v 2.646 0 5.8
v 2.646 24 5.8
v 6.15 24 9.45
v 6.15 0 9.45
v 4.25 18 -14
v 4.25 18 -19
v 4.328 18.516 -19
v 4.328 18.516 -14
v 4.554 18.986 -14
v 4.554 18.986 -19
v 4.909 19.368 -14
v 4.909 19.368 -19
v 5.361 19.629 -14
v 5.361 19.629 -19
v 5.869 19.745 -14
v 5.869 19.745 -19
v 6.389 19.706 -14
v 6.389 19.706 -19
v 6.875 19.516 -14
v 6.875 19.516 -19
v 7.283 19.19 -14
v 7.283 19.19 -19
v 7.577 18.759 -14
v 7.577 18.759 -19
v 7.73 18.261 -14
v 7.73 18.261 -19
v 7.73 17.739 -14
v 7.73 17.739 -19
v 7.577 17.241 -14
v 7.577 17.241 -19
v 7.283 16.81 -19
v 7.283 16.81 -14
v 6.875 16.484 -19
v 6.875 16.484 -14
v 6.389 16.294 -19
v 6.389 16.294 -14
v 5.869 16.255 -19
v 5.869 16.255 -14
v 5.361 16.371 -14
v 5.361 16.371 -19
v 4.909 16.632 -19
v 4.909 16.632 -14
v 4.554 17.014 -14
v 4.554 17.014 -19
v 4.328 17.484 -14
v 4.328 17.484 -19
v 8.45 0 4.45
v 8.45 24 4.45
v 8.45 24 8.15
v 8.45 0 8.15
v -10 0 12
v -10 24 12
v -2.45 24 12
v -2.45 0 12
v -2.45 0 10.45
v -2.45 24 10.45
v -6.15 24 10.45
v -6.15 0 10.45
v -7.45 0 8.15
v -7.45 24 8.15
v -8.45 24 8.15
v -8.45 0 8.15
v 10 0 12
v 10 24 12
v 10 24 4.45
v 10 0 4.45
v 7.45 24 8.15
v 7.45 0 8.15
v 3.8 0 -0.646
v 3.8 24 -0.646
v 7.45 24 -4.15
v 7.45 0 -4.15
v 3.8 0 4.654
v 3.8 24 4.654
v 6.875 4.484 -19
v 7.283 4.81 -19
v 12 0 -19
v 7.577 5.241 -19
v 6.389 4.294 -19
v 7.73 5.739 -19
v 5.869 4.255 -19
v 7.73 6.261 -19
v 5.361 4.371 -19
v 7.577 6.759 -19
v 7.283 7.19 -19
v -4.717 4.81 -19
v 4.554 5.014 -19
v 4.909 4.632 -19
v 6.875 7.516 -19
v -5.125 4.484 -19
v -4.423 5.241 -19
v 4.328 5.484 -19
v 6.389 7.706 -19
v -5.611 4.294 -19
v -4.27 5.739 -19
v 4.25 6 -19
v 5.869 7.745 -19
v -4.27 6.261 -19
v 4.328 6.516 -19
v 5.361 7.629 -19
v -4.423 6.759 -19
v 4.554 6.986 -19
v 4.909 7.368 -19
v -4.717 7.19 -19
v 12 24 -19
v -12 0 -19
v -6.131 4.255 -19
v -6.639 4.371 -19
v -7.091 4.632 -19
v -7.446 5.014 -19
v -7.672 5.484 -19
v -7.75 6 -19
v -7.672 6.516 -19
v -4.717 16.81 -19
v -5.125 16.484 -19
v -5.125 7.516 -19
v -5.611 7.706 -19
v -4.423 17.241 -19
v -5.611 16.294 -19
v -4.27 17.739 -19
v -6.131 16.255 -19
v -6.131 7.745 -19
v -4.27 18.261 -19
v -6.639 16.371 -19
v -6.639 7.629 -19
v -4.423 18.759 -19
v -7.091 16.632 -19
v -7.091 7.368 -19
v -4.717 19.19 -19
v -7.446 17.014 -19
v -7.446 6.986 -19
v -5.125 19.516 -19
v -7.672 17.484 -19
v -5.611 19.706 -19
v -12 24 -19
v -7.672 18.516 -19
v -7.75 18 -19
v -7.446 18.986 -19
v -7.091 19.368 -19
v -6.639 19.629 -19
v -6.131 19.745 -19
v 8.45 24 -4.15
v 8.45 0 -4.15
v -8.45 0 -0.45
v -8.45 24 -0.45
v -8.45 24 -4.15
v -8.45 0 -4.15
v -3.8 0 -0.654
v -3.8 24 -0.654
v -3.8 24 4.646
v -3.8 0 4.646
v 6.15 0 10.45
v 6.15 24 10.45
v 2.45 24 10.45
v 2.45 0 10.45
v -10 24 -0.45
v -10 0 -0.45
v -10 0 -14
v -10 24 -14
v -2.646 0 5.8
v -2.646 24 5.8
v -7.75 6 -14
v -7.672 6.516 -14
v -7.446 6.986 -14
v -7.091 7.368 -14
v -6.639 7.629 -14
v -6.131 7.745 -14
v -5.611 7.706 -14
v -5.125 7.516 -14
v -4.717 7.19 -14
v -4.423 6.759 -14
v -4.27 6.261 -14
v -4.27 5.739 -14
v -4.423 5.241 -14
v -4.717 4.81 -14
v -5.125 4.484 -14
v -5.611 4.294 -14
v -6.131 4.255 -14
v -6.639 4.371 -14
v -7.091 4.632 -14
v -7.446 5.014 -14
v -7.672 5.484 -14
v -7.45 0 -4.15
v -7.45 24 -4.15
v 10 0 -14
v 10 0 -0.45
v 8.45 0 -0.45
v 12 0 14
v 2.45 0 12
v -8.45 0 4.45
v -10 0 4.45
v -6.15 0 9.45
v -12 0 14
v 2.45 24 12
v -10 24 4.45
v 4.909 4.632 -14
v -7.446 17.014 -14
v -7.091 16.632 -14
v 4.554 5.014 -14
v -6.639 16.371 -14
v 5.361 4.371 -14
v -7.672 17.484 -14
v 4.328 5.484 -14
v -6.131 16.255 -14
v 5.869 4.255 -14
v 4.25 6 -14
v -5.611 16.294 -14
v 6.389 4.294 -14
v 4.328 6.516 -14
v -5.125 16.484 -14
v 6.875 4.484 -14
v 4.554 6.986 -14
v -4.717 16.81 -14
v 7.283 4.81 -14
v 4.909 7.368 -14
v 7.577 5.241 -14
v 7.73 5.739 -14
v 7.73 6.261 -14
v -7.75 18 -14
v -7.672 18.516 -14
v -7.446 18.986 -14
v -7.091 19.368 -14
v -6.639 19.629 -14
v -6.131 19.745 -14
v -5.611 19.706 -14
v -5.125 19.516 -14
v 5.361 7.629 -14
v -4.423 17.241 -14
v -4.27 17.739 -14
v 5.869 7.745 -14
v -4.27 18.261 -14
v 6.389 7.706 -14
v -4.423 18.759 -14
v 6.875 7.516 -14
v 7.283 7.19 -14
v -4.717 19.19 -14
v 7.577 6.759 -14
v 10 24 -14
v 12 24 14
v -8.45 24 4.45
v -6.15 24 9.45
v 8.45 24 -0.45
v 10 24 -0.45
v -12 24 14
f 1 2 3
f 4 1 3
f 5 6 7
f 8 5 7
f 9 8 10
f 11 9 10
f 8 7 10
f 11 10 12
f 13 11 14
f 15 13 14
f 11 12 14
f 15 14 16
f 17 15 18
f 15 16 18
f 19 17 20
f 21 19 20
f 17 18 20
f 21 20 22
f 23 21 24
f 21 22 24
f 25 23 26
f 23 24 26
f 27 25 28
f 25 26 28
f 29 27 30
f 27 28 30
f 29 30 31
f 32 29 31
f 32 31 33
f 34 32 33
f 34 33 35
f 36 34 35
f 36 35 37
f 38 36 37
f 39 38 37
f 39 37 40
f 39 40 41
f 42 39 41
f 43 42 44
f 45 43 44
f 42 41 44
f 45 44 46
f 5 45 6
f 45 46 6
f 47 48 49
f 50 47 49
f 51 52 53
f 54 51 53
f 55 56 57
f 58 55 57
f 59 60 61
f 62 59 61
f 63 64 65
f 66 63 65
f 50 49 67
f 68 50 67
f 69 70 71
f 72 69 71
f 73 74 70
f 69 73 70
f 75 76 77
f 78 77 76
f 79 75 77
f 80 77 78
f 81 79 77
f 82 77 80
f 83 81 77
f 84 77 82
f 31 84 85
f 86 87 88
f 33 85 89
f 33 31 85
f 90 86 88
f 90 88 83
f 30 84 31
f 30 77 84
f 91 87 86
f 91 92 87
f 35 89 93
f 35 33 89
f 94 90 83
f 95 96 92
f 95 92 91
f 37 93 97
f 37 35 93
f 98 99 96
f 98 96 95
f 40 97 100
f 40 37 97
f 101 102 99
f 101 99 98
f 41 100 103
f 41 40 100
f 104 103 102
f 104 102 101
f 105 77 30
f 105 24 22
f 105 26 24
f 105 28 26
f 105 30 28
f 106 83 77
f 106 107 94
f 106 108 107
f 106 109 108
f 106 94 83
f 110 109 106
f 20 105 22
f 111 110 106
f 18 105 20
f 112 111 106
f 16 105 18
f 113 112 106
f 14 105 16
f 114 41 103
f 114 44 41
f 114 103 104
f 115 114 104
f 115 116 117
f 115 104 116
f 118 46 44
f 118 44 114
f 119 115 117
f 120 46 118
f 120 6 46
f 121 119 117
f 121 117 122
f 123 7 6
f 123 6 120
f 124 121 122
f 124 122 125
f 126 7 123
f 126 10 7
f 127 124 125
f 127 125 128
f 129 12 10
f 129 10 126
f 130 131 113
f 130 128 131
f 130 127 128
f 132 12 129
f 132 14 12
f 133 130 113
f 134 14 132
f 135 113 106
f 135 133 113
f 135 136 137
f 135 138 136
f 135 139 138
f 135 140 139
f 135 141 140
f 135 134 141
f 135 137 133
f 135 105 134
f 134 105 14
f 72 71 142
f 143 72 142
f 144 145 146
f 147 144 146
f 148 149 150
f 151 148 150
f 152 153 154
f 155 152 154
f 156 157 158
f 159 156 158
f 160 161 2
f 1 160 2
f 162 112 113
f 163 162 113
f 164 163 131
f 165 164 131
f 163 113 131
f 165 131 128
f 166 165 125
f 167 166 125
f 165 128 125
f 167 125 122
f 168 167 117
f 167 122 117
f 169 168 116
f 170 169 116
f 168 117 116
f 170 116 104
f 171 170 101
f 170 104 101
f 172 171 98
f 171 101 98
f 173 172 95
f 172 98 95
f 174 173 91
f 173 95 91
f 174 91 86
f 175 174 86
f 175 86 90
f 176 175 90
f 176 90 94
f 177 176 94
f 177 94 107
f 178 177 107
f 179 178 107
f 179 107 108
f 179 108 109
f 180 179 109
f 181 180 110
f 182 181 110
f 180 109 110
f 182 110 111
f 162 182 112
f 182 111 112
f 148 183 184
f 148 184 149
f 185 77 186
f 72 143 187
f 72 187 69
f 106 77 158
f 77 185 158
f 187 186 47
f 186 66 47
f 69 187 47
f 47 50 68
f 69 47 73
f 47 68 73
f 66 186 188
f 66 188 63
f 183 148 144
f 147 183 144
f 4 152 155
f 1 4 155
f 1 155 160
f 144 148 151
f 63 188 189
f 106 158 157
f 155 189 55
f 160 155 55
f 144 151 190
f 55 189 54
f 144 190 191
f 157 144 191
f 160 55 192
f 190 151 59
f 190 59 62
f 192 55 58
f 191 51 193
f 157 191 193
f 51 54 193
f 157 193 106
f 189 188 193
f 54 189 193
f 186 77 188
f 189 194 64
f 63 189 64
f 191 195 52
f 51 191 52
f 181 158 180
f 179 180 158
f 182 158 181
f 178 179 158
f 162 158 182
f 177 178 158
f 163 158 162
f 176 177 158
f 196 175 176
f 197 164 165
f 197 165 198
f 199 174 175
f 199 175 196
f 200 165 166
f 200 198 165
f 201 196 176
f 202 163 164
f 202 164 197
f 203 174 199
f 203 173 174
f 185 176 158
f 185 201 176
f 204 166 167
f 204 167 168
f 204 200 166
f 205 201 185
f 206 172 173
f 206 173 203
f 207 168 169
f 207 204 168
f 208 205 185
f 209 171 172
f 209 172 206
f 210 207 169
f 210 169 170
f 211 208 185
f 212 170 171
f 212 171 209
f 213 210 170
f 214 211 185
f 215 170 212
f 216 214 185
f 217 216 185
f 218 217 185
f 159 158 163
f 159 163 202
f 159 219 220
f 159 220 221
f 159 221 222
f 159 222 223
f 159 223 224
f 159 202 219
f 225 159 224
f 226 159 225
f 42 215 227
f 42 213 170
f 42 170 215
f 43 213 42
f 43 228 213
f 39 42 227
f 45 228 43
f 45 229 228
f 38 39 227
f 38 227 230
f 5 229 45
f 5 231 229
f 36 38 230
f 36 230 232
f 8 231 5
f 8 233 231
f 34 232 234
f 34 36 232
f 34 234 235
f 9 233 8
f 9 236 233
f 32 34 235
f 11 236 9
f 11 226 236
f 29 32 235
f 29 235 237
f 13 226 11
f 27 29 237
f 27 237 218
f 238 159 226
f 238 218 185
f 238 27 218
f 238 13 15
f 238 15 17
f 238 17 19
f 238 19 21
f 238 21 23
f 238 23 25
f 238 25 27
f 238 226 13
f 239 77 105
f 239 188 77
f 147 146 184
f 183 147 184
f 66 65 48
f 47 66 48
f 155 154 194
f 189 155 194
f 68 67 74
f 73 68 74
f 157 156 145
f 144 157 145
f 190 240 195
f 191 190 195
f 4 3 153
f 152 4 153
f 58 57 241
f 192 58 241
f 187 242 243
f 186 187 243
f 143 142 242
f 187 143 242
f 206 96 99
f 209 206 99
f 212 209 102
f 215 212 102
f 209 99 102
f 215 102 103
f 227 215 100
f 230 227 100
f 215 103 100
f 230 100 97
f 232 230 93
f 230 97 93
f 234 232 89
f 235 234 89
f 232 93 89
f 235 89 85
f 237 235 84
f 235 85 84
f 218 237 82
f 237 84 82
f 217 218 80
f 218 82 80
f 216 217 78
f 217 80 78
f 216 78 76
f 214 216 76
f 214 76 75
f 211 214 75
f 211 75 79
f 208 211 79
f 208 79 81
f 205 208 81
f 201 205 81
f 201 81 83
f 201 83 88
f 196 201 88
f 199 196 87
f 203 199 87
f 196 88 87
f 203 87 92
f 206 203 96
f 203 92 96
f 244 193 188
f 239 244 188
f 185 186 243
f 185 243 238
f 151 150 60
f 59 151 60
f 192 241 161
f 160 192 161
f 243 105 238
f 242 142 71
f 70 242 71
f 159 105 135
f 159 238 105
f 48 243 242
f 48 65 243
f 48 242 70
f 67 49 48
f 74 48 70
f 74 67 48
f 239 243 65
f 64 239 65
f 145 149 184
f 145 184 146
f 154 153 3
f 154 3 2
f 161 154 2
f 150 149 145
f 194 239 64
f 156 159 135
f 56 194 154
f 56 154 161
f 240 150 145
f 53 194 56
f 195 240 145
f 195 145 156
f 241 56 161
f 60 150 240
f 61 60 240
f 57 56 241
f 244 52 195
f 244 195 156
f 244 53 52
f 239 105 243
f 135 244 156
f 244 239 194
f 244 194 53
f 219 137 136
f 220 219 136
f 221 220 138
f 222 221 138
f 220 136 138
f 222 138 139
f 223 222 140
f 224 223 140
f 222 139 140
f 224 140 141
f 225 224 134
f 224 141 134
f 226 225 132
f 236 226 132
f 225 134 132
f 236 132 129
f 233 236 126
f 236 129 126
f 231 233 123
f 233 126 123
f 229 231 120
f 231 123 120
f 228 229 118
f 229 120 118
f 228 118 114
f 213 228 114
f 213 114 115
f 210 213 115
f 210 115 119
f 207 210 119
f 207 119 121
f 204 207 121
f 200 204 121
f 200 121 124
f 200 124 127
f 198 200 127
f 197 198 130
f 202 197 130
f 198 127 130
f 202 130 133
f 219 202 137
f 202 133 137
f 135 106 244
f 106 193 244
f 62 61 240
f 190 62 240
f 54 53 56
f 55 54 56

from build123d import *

# Parameters (mm, degrees)
ESQUISSE1_W             = 24
ESQUISSE1_H             = 28
BOSS_EXTRU_1_DEPTH      = 24
ENL_V_MAT_EXTRU_1_DEPTH = 24
ESQUISSE5_W             = 24
ESQUISSE5_H             = 24
BOSS_EXTRU_2_DEPTH      = 5
ENL_V_MAT_EXTRU_6_DEPTH = 24
ESQUISSE7_R             = 1.75
ENL_V_MAT_EXTRU_8_DEPTH = 5


with BuildPart() as part:
    # Esquisse1 → Boss.-Extru.1 (new body)
    with BuildSketch(Plane(origin=(0, 0, 0), x_dir=(1, 0, 0), z_dir=(0, 1, 0))):
        Rectangle(ESQUISSE1_W, ESQUISSE1_H)
    extrude(amount=BOSS_EXTRU_1_DEPTH)

    # Esquisse3 → Enlèv. mat.-Extru.1 (cut)
    with BuildSketch(Plane(origin=(0, 24, 0), x_dir=(1, 0, 0), z_dir=(0, 1, 0))):
        Polygon((-10, -12), (-2.45, -12), (-2.45, -10.45), (-6.15, -10.45), (-6.15, -9.45), (-2.645559959, -5.8), (2.645559959, -5.8), (6.15, -9.45), (6.15, -10.45), (2.45, -10.45), (2.45, -12), (10, -12), (10, -4.45), (8.45, -4.45), (8.45, -8.15), (7.45, -8.15), (3.8, -4.654440041), (3.8, 0.645559959), (7.45, 4.15), (8.45, 4.15), (8.45, 0.45), (10, 0.45), (10, 8), (2.45, 8), (2.45, 6.45), (6.15, 6.45), (6.15, 5.45), (2.645559959, 1.8), (-2.645559959, 1.8), (-6.15, 5.45), (-6.15, 6.45), (-2.45, 6.45), (-2.45, 8), (-10, 8), (-10, 0.45), (-8.45, 0.45), (-8.45, 4.15), (-7.45, 4.15), (-3.8, 0.654440041), (-3.8, -4.645559959), (-7.45, -8.15), (-8.45, -8.15), (-8.45, -4.45), (-10, -4.45), align=None)
    extrude(amount=-ENL_V_MAT_EXTRU_1_DEPTH, mode=Mode.SUBTRACT)

    # Esquisse5 → Boss.-Extru.2 (add)
    with BuildSketch(Plane(origin=(0, 0, -14), x_dir=(-1, 0, 0), z_dir=(0, 0, -1))):
        with Locations((0, 12)):
            Rectangle(ESQUISSE5_W, ESQUISSE5_H)
    extrude(amount=BOSS_EXTRU_2_DEPTH)

    # Esquisse6 → Enlèv. mat.-Extru.6 (cut)
    with BuildSketch(Plane(origin=(0, 24, 0), x_dir=(1, 0, 0), z_dir=(0, 1, 0))):
        Polygon((-10, 8), (-10, 14), (10, 14), (10, 8), (2.45, 8), (2.45, 6.45), (6.15, 6.45), (6.15, 5.45), (2.645559959, 1.8), (-2.645559959, 1.8), (-6.15, 5.45), (-6.15, 6.45), (-2.45, 6.45), (-2.45, 8), align=None)
    extrude(amount=-ENL_V_MAT_EXTRU_6_DEPTH, mode=Mode.SUBTRACT)

    # Esquisse7 → Enlèv. mat.-Extru.8 (cut)
    with BuildSketch(Plane(origin=(0, 0, -19), x_dir=(-1, 0, 0), z_dir=(0, 0, -1))):
        with Locations((-6, 18)):
            Circle(ESQUISSE7_R)
        with Locations((-6, 6)):
            Circle(ESQUISSE7_R)
        with Locations((6, 6)):
            Circle(ESQUISSE7_R)
        with Locations((6, 18)):
            Circle(ESQUISSE7_R)
    extrude(amount=-ENL_V_MAT_EXTRU_8_DEPTH, mode=Mode.SUBTRACT)


solid = part.part
